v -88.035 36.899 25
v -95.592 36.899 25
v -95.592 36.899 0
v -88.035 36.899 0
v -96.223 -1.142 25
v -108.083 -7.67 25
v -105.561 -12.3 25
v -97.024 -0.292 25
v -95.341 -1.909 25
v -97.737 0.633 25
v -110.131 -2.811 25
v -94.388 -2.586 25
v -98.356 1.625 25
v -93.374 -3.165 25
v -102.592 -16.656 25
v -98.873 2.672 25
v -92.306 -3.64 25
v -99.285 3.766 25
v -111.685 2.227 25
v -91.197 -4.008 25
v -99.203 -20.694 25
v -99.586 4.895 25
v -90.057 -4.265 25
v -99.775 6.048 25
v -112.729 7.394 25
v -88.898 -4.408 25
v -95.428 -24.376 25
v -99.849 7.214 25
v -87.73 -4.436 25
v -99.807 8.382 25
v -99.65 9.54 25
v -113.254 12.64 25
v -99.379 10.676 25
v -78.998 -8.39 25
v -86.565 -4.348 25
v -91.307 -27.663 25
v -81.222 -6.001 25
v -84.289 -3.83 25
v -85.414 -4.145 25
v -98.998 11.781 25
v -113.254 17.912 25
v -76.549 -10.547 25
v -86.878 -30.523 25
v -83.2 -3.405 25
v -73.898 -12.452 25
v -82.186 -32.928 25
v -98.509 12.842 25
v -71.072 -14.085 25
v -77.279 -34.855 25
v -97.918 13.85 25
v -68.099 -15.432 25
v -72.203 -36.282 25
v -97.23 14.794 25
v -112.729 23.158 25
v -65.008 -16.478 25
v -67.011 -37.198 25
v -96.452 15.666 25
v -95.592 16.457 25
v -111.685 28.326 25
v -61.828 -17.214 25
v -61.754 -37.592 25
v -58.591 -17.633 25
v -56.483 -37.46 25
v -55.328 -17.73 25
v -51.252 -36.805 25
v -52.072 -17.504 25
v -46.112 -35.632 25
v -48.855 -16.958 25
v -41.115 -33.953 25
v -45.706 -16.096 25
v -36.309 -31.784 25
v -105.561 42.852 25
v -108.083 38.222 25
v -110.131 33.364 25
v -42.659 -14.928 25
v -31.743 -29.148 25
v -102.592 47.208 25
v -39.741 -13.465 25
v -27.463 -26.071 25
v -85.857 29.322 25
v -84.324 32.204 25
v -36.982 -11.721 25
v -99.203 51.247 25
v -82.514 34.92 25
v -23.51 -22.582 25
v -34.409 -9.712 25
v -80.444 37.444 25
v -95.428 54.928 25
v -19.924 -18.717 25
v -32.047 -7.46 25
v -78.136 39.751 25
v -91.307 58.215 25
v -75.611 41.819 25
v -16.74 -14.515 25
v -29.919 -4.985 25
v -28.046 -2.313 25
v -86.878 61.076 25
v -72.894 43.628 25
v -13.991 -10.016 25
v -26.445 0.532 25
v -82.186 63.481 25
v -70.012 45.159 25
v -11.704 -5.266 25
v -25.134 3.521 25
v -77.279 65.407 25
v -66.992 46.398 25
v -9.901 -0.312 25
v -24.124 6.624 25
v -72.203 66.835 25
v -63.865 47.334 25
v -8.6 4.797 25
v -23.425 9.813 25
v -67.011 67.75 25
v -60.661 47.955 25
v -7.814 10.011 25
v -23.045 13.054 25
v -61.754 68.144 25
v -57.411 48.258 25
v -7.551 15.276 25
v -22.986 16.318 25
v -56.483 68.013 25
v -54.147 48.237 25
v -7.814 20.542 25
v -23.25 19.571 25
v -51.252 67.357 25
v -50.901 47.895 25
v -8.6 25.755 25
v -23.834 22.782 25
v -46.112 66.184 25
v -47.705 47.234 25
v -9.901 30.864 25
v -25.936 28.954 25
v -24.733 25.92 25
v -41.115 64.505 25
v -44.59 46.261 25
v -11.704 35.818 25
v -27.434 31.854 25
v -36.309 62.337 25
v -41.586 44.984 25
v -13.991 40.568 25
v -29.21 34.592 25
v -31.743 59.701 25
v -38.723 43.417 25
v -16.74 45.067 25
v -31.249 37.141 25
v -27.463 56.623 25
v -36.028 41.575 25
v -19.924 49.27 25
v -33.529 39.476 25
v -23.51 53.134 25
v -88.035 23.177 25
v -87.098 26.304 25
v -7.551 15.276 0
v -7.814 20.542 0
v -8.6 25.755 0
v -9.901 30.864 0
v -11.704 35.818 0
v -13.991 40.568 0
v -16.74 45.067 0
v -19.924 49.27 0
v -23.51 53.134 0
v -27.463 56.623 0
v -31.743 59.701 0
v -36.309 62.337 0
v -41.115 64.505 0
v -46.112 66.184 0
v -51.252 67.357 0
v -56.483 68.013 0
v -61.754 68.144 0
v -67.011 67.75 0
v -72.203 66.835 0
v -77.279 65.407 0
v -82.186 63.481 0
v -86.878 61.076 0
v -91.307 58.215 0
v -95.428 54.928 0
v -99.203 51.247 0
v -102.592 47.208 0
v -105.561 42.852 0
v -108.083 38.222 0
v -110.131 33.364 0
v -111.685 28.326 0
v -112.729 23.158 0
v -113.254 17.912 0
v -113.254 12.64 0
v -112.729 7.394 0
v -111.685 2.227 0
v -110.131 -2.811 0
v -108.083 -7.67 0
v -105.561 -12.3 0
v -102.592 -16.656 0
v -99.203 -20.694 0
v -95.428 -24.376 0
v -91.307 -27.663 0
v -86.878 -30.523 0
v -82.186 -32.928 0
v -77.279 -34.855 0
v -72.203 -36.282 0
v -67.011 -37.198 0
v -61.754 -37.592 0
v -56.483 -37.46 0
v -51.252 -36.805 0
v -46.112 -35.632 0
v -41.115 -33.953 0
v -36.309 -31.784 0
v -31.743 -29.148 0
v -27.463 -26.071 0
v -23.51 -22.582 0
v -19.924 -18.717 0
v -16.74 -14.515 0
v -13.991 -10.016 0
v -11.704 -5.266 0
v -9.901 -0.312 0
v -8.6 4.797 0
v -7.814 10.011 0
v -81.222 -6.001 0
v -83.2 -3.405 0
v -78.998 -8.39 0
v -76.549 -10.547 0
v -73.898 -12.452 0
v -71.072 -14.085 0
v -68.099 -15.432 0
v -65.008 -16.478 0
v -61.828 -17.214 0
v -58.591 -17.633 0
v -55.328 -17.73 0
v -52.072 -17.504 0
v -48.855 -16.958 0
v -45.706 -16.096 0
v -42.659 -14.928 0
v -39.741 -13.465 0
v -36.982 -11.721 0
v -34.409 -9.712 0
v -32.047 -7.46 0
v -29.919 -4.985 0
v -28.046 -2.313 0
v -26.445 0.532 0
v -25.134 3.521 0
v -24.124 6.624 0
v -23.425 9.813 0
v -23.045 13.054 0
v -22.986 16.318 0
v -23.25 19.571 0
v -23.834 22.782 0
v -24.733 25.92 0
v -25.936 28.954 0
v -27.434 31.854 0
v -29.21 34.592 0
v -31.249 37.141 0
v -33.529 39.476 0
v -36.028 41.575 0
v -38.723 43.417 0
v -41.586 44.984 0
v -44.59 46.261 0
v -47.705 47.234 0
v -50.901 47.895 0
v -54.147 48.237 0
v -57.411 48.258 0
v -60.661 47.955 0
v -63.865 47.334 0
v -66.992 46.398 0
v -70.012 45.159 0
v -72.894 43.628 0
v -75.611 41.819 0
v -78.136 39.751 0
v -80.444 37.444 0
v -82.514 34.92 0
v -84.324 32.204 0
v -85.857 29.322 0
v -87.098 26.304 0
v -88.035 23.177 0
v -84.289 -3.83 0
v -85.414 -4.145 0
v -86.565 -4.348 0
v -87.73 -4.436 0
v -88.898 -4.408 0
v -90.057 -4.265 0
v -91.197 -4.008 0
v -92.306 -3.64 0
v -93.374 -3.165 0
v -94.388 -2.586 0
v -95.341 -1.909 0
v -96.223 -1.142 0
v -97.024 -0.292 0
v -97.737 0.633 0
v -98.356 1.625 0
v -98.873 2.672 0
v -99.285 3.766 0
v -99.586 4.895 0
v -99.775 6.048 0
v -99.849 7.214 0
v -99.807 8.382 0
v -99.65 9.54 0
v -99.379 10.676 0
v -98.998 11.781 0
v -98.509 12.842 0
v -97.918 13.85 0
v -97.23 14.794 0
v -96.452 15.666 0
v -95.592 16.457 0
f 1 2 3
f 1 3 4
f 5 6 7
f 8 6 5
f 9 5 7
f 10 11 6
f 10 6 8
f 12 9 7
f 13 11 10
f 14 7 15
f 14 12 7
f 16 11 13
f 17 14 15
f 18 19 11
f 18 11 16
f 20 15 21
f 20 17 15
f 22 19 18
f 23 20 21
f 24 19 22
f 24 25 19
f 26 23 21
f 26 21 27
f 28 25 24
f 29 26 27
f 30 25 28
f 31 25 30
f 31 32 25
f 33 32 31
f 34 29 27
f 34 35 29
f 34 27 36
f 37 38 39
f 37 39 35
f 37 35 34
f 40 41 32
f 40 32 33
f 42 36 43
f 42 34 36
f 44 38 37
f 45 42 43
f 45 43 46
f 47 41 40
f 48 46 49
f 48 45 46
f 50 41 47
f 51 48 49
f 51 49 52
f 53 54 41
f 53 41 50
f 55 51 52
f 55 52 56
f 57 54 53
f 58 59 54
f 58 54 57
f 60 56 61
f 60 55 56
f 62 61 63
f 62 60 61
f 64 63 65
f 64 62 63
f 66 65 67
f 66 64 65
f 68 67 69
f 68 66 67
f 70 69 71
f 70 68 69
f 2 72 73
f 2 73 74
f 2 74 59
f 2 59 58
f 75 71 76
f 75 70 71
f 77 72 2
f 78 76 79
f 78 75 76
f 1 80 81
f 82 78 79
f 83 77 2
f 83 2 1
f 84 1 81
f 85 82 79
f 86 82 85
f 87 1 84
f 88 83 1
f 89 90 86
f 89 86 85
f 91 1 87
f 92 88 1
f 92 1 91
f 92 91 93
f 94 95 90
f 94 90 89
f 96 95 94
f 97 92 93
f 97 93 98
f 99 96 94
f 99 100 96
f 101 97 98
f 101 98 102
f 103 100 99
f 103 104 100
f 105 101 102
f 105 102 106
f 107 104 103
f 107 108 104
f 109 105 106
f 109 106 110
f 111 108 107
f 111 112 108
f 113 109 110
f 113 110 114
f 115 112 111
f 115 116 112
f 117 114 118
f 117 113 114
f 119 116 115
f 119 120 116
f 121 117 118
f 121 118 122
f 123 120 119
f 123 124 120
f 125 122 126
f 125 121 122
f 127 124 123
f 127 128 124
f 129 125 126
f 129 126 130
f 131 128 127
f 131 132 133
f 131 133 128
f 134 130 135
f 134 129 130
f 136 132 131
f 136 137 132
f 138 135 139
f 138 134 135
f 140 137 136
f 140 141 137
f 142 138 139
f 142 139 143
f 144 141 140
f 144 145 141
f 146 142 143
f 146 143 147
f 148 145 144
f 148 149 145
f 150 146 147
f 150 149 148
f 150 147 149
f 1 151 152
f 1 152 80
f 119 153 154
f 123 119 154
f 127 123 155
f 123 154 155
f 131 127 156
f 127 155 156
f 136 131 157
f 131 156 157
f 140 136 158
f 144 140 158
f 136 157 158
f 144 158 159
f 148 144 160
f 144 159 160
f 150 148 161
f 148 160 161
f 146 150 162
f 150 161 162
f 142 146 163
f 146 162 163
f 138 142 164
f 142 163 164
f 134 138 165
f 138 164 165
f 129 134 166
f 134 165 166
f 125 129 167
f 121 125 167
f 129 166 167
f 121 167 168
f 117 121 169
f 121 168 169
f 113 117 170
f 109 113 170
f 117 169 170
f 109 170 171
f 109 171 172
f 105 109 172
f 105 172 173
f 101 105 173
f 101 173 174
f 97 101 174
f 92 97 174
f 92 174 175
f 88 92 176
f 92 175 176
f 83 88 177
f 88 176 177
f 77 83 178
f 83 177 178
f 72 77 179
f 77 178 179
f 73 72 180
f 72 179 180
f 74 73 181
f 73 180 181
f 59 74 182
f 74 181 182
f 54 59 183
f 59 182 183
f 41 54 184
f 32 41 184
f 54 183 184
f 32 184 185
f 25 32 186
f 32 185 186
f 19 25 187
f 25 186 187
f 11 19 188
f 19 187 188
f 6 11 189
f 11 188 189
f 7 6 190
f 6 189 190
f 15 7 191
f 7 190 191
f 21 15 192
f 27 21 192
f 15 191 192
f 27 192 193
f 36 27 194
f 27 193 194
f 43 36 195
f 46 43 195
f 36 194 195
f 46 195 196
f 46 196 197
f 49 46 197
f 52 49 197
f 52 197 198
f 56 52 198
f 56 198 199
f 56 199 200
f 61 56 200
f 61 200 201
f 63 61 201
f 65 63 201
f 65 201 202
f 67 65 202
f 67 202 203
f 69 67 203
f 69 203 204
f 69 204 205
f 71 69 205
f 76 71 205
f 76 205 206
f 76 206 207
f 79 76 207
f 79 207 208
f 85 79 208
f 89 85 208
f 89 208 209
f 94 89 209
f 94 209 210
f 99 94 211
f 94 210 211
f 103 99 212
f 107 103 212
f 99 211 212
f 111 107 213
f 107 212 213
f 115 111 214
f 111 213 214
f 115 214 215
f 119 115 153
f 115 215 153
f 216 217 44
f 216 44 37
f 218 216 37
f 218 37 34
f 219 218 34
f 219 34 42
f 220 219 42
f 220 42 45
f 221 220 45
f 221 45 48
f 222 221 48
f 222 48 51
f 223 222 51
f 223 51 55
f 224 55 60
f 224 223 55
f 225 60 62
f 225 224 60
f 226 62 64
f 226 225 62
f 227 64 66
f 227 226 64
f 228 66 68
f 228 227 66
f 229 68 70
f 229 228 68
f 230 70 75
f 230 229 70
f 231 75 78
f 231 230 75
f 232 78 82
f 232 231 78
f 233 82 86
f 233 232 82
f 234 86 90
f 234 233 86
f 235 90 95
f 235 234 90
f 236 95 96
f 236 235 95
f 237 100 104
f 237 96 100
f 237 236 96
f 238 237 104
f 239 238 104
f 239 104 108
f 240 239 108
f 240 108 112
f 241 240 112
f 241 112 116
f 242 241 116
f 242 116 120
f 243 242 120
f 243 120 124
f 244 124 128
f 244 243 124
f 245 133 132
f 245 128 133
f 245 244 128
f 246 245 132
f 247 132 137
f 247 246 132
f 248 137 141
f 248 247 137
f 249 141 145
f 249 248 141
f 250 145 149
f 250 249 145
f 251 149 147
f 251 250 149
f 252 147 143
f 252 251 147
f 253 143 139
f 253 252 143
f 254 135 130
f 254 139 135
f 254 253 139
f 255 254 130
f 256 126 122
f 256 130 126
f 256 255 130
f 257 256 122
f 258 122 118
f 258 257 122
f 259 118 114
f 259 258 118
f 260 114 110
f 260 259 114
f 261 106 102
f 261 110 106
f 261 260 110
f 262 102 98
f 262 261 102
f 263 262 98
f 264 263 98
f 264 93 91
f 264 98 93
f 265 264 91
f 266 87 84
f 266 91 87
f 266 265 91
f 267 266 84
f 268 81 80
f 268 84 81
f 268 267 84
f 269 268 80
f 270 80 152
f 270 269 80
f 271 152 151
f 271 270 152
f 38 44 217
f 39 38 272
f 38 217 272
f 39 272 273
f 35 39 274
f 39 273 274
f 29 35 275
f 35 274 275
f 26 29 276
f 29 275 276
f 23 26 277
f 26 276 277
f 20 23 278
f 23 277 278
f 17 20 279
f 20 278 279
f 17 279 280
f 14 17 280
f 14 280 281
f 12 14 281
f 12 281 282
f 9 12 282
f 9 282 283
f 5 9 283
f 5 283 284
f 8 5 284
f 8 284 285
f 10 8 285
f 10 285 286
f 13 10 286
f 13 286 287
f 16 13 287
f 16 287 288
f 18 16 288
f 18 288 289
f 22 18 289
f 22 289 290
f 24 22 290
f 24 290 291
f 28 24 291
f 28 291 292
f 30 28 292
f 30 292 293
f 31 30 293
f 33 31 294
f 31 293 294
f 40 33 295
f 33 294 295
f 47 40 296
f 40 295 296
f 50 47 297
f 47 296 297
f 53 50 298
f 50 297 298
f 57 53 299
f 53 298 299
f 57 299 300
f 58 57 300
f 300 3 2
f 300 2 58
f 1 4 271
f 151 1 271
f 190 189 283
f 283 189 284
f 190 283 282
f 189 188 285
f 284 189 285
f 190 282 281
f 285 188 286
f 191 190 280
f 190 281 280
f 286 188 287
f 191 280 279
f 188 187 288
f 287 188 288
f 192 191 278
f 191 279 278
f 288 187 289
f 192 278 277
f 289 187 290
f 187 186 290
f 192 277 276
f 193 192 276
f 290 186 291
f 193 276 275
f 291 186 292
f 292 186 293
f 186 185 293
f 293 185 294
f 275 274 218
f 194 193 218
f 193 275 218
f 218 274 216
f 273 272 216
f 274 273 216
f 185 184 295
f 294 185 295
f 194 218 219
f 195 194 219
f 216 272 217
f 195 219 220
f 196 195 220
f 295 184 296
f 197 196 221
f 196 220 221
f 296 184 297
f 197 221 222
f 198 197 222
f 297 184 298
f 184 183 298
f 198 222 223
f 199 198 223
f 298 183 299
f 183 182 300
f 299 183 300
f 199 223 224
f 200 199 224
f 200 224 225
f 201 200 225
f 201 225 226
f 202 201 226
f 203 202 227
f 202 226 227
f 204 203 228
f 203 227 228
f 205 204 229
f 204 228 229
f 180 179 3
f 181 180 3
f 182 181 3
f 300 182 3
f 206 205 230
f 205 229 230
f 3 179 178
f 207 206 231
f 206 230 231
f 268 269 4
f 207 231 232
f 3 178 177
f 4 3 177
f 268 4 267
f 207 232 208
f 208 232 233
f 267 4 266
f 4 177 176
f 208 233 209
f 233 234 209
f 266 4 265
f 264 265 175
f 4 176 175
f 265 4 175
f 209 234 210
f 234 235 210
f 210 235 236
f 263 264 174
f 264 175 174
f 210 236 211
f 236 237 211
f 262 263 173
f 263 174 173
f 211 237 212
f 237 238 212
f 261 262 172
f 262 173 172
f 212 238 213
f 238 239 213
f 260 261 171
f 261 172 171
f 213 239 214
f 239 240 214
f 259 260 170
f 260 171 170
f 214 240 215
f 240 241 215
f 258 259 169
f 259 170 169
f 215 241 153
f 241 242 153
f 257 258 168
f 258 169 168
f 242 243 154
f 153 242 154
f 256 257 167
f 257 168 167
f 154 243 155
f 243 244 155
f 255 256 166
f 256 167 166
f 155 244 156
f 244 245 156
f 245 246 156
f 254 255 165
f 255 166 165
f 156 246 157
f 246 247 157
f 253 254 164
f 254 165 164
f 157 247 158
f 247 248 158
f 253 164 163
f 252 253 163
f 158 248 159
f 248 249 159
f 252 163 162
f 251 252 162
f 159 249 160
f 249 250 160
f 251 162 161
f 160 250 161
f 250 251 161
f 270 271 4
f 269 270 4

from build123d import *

# Parameters (mm, degrees)
F0_R     = 52.884546
F0_R_2   = 33.012326
F1_DEPTH = 25
F2_W     = 7.556897
F2_H     = 29.523836
F3_DEPTH = 25
F4_R     = 11.814692
F5_DEPTH = 25


with BuildPart() as f1:
    # F0 (on Top) → F1 (new body)
    with BuildSketch(Plane.XY):
        with Locations((-60.435541, 15.276187)):
            Circle(F0_R)
        with Locations((-55.982087, 15.276187)):
            Circle(F0_R_2, mode=Mode.SUBTRACT)
    extrude(amount=F1_DEPTH)

    # F2 (on face) → F3 (cut)
    with BuildSketch(Plane(origin=(0, 0, 0), x_dir=(1, 0, 0), z_dir=(0, 0, -1))):
        with Locations((-91.813431, -22.13712)):
            Rectangle(F2_W, F2_H)
    extrude(amount=-F3_DEPTH, mode=Mode.SUBTRACT)

    # F4 (on face) → F5 (cut)
    with BuildSketch(Plane(origin=(0, 0, 0), x_dir=(1, 0, 0), z_dir=(0, 0, -1))):
        with Locations((-88.034983, -7.375202)):
            Circle(F4_R)
    extrude(amount=-F5_DEPTH, mode=Mode.SUBTRACT)


solid = f1.part
